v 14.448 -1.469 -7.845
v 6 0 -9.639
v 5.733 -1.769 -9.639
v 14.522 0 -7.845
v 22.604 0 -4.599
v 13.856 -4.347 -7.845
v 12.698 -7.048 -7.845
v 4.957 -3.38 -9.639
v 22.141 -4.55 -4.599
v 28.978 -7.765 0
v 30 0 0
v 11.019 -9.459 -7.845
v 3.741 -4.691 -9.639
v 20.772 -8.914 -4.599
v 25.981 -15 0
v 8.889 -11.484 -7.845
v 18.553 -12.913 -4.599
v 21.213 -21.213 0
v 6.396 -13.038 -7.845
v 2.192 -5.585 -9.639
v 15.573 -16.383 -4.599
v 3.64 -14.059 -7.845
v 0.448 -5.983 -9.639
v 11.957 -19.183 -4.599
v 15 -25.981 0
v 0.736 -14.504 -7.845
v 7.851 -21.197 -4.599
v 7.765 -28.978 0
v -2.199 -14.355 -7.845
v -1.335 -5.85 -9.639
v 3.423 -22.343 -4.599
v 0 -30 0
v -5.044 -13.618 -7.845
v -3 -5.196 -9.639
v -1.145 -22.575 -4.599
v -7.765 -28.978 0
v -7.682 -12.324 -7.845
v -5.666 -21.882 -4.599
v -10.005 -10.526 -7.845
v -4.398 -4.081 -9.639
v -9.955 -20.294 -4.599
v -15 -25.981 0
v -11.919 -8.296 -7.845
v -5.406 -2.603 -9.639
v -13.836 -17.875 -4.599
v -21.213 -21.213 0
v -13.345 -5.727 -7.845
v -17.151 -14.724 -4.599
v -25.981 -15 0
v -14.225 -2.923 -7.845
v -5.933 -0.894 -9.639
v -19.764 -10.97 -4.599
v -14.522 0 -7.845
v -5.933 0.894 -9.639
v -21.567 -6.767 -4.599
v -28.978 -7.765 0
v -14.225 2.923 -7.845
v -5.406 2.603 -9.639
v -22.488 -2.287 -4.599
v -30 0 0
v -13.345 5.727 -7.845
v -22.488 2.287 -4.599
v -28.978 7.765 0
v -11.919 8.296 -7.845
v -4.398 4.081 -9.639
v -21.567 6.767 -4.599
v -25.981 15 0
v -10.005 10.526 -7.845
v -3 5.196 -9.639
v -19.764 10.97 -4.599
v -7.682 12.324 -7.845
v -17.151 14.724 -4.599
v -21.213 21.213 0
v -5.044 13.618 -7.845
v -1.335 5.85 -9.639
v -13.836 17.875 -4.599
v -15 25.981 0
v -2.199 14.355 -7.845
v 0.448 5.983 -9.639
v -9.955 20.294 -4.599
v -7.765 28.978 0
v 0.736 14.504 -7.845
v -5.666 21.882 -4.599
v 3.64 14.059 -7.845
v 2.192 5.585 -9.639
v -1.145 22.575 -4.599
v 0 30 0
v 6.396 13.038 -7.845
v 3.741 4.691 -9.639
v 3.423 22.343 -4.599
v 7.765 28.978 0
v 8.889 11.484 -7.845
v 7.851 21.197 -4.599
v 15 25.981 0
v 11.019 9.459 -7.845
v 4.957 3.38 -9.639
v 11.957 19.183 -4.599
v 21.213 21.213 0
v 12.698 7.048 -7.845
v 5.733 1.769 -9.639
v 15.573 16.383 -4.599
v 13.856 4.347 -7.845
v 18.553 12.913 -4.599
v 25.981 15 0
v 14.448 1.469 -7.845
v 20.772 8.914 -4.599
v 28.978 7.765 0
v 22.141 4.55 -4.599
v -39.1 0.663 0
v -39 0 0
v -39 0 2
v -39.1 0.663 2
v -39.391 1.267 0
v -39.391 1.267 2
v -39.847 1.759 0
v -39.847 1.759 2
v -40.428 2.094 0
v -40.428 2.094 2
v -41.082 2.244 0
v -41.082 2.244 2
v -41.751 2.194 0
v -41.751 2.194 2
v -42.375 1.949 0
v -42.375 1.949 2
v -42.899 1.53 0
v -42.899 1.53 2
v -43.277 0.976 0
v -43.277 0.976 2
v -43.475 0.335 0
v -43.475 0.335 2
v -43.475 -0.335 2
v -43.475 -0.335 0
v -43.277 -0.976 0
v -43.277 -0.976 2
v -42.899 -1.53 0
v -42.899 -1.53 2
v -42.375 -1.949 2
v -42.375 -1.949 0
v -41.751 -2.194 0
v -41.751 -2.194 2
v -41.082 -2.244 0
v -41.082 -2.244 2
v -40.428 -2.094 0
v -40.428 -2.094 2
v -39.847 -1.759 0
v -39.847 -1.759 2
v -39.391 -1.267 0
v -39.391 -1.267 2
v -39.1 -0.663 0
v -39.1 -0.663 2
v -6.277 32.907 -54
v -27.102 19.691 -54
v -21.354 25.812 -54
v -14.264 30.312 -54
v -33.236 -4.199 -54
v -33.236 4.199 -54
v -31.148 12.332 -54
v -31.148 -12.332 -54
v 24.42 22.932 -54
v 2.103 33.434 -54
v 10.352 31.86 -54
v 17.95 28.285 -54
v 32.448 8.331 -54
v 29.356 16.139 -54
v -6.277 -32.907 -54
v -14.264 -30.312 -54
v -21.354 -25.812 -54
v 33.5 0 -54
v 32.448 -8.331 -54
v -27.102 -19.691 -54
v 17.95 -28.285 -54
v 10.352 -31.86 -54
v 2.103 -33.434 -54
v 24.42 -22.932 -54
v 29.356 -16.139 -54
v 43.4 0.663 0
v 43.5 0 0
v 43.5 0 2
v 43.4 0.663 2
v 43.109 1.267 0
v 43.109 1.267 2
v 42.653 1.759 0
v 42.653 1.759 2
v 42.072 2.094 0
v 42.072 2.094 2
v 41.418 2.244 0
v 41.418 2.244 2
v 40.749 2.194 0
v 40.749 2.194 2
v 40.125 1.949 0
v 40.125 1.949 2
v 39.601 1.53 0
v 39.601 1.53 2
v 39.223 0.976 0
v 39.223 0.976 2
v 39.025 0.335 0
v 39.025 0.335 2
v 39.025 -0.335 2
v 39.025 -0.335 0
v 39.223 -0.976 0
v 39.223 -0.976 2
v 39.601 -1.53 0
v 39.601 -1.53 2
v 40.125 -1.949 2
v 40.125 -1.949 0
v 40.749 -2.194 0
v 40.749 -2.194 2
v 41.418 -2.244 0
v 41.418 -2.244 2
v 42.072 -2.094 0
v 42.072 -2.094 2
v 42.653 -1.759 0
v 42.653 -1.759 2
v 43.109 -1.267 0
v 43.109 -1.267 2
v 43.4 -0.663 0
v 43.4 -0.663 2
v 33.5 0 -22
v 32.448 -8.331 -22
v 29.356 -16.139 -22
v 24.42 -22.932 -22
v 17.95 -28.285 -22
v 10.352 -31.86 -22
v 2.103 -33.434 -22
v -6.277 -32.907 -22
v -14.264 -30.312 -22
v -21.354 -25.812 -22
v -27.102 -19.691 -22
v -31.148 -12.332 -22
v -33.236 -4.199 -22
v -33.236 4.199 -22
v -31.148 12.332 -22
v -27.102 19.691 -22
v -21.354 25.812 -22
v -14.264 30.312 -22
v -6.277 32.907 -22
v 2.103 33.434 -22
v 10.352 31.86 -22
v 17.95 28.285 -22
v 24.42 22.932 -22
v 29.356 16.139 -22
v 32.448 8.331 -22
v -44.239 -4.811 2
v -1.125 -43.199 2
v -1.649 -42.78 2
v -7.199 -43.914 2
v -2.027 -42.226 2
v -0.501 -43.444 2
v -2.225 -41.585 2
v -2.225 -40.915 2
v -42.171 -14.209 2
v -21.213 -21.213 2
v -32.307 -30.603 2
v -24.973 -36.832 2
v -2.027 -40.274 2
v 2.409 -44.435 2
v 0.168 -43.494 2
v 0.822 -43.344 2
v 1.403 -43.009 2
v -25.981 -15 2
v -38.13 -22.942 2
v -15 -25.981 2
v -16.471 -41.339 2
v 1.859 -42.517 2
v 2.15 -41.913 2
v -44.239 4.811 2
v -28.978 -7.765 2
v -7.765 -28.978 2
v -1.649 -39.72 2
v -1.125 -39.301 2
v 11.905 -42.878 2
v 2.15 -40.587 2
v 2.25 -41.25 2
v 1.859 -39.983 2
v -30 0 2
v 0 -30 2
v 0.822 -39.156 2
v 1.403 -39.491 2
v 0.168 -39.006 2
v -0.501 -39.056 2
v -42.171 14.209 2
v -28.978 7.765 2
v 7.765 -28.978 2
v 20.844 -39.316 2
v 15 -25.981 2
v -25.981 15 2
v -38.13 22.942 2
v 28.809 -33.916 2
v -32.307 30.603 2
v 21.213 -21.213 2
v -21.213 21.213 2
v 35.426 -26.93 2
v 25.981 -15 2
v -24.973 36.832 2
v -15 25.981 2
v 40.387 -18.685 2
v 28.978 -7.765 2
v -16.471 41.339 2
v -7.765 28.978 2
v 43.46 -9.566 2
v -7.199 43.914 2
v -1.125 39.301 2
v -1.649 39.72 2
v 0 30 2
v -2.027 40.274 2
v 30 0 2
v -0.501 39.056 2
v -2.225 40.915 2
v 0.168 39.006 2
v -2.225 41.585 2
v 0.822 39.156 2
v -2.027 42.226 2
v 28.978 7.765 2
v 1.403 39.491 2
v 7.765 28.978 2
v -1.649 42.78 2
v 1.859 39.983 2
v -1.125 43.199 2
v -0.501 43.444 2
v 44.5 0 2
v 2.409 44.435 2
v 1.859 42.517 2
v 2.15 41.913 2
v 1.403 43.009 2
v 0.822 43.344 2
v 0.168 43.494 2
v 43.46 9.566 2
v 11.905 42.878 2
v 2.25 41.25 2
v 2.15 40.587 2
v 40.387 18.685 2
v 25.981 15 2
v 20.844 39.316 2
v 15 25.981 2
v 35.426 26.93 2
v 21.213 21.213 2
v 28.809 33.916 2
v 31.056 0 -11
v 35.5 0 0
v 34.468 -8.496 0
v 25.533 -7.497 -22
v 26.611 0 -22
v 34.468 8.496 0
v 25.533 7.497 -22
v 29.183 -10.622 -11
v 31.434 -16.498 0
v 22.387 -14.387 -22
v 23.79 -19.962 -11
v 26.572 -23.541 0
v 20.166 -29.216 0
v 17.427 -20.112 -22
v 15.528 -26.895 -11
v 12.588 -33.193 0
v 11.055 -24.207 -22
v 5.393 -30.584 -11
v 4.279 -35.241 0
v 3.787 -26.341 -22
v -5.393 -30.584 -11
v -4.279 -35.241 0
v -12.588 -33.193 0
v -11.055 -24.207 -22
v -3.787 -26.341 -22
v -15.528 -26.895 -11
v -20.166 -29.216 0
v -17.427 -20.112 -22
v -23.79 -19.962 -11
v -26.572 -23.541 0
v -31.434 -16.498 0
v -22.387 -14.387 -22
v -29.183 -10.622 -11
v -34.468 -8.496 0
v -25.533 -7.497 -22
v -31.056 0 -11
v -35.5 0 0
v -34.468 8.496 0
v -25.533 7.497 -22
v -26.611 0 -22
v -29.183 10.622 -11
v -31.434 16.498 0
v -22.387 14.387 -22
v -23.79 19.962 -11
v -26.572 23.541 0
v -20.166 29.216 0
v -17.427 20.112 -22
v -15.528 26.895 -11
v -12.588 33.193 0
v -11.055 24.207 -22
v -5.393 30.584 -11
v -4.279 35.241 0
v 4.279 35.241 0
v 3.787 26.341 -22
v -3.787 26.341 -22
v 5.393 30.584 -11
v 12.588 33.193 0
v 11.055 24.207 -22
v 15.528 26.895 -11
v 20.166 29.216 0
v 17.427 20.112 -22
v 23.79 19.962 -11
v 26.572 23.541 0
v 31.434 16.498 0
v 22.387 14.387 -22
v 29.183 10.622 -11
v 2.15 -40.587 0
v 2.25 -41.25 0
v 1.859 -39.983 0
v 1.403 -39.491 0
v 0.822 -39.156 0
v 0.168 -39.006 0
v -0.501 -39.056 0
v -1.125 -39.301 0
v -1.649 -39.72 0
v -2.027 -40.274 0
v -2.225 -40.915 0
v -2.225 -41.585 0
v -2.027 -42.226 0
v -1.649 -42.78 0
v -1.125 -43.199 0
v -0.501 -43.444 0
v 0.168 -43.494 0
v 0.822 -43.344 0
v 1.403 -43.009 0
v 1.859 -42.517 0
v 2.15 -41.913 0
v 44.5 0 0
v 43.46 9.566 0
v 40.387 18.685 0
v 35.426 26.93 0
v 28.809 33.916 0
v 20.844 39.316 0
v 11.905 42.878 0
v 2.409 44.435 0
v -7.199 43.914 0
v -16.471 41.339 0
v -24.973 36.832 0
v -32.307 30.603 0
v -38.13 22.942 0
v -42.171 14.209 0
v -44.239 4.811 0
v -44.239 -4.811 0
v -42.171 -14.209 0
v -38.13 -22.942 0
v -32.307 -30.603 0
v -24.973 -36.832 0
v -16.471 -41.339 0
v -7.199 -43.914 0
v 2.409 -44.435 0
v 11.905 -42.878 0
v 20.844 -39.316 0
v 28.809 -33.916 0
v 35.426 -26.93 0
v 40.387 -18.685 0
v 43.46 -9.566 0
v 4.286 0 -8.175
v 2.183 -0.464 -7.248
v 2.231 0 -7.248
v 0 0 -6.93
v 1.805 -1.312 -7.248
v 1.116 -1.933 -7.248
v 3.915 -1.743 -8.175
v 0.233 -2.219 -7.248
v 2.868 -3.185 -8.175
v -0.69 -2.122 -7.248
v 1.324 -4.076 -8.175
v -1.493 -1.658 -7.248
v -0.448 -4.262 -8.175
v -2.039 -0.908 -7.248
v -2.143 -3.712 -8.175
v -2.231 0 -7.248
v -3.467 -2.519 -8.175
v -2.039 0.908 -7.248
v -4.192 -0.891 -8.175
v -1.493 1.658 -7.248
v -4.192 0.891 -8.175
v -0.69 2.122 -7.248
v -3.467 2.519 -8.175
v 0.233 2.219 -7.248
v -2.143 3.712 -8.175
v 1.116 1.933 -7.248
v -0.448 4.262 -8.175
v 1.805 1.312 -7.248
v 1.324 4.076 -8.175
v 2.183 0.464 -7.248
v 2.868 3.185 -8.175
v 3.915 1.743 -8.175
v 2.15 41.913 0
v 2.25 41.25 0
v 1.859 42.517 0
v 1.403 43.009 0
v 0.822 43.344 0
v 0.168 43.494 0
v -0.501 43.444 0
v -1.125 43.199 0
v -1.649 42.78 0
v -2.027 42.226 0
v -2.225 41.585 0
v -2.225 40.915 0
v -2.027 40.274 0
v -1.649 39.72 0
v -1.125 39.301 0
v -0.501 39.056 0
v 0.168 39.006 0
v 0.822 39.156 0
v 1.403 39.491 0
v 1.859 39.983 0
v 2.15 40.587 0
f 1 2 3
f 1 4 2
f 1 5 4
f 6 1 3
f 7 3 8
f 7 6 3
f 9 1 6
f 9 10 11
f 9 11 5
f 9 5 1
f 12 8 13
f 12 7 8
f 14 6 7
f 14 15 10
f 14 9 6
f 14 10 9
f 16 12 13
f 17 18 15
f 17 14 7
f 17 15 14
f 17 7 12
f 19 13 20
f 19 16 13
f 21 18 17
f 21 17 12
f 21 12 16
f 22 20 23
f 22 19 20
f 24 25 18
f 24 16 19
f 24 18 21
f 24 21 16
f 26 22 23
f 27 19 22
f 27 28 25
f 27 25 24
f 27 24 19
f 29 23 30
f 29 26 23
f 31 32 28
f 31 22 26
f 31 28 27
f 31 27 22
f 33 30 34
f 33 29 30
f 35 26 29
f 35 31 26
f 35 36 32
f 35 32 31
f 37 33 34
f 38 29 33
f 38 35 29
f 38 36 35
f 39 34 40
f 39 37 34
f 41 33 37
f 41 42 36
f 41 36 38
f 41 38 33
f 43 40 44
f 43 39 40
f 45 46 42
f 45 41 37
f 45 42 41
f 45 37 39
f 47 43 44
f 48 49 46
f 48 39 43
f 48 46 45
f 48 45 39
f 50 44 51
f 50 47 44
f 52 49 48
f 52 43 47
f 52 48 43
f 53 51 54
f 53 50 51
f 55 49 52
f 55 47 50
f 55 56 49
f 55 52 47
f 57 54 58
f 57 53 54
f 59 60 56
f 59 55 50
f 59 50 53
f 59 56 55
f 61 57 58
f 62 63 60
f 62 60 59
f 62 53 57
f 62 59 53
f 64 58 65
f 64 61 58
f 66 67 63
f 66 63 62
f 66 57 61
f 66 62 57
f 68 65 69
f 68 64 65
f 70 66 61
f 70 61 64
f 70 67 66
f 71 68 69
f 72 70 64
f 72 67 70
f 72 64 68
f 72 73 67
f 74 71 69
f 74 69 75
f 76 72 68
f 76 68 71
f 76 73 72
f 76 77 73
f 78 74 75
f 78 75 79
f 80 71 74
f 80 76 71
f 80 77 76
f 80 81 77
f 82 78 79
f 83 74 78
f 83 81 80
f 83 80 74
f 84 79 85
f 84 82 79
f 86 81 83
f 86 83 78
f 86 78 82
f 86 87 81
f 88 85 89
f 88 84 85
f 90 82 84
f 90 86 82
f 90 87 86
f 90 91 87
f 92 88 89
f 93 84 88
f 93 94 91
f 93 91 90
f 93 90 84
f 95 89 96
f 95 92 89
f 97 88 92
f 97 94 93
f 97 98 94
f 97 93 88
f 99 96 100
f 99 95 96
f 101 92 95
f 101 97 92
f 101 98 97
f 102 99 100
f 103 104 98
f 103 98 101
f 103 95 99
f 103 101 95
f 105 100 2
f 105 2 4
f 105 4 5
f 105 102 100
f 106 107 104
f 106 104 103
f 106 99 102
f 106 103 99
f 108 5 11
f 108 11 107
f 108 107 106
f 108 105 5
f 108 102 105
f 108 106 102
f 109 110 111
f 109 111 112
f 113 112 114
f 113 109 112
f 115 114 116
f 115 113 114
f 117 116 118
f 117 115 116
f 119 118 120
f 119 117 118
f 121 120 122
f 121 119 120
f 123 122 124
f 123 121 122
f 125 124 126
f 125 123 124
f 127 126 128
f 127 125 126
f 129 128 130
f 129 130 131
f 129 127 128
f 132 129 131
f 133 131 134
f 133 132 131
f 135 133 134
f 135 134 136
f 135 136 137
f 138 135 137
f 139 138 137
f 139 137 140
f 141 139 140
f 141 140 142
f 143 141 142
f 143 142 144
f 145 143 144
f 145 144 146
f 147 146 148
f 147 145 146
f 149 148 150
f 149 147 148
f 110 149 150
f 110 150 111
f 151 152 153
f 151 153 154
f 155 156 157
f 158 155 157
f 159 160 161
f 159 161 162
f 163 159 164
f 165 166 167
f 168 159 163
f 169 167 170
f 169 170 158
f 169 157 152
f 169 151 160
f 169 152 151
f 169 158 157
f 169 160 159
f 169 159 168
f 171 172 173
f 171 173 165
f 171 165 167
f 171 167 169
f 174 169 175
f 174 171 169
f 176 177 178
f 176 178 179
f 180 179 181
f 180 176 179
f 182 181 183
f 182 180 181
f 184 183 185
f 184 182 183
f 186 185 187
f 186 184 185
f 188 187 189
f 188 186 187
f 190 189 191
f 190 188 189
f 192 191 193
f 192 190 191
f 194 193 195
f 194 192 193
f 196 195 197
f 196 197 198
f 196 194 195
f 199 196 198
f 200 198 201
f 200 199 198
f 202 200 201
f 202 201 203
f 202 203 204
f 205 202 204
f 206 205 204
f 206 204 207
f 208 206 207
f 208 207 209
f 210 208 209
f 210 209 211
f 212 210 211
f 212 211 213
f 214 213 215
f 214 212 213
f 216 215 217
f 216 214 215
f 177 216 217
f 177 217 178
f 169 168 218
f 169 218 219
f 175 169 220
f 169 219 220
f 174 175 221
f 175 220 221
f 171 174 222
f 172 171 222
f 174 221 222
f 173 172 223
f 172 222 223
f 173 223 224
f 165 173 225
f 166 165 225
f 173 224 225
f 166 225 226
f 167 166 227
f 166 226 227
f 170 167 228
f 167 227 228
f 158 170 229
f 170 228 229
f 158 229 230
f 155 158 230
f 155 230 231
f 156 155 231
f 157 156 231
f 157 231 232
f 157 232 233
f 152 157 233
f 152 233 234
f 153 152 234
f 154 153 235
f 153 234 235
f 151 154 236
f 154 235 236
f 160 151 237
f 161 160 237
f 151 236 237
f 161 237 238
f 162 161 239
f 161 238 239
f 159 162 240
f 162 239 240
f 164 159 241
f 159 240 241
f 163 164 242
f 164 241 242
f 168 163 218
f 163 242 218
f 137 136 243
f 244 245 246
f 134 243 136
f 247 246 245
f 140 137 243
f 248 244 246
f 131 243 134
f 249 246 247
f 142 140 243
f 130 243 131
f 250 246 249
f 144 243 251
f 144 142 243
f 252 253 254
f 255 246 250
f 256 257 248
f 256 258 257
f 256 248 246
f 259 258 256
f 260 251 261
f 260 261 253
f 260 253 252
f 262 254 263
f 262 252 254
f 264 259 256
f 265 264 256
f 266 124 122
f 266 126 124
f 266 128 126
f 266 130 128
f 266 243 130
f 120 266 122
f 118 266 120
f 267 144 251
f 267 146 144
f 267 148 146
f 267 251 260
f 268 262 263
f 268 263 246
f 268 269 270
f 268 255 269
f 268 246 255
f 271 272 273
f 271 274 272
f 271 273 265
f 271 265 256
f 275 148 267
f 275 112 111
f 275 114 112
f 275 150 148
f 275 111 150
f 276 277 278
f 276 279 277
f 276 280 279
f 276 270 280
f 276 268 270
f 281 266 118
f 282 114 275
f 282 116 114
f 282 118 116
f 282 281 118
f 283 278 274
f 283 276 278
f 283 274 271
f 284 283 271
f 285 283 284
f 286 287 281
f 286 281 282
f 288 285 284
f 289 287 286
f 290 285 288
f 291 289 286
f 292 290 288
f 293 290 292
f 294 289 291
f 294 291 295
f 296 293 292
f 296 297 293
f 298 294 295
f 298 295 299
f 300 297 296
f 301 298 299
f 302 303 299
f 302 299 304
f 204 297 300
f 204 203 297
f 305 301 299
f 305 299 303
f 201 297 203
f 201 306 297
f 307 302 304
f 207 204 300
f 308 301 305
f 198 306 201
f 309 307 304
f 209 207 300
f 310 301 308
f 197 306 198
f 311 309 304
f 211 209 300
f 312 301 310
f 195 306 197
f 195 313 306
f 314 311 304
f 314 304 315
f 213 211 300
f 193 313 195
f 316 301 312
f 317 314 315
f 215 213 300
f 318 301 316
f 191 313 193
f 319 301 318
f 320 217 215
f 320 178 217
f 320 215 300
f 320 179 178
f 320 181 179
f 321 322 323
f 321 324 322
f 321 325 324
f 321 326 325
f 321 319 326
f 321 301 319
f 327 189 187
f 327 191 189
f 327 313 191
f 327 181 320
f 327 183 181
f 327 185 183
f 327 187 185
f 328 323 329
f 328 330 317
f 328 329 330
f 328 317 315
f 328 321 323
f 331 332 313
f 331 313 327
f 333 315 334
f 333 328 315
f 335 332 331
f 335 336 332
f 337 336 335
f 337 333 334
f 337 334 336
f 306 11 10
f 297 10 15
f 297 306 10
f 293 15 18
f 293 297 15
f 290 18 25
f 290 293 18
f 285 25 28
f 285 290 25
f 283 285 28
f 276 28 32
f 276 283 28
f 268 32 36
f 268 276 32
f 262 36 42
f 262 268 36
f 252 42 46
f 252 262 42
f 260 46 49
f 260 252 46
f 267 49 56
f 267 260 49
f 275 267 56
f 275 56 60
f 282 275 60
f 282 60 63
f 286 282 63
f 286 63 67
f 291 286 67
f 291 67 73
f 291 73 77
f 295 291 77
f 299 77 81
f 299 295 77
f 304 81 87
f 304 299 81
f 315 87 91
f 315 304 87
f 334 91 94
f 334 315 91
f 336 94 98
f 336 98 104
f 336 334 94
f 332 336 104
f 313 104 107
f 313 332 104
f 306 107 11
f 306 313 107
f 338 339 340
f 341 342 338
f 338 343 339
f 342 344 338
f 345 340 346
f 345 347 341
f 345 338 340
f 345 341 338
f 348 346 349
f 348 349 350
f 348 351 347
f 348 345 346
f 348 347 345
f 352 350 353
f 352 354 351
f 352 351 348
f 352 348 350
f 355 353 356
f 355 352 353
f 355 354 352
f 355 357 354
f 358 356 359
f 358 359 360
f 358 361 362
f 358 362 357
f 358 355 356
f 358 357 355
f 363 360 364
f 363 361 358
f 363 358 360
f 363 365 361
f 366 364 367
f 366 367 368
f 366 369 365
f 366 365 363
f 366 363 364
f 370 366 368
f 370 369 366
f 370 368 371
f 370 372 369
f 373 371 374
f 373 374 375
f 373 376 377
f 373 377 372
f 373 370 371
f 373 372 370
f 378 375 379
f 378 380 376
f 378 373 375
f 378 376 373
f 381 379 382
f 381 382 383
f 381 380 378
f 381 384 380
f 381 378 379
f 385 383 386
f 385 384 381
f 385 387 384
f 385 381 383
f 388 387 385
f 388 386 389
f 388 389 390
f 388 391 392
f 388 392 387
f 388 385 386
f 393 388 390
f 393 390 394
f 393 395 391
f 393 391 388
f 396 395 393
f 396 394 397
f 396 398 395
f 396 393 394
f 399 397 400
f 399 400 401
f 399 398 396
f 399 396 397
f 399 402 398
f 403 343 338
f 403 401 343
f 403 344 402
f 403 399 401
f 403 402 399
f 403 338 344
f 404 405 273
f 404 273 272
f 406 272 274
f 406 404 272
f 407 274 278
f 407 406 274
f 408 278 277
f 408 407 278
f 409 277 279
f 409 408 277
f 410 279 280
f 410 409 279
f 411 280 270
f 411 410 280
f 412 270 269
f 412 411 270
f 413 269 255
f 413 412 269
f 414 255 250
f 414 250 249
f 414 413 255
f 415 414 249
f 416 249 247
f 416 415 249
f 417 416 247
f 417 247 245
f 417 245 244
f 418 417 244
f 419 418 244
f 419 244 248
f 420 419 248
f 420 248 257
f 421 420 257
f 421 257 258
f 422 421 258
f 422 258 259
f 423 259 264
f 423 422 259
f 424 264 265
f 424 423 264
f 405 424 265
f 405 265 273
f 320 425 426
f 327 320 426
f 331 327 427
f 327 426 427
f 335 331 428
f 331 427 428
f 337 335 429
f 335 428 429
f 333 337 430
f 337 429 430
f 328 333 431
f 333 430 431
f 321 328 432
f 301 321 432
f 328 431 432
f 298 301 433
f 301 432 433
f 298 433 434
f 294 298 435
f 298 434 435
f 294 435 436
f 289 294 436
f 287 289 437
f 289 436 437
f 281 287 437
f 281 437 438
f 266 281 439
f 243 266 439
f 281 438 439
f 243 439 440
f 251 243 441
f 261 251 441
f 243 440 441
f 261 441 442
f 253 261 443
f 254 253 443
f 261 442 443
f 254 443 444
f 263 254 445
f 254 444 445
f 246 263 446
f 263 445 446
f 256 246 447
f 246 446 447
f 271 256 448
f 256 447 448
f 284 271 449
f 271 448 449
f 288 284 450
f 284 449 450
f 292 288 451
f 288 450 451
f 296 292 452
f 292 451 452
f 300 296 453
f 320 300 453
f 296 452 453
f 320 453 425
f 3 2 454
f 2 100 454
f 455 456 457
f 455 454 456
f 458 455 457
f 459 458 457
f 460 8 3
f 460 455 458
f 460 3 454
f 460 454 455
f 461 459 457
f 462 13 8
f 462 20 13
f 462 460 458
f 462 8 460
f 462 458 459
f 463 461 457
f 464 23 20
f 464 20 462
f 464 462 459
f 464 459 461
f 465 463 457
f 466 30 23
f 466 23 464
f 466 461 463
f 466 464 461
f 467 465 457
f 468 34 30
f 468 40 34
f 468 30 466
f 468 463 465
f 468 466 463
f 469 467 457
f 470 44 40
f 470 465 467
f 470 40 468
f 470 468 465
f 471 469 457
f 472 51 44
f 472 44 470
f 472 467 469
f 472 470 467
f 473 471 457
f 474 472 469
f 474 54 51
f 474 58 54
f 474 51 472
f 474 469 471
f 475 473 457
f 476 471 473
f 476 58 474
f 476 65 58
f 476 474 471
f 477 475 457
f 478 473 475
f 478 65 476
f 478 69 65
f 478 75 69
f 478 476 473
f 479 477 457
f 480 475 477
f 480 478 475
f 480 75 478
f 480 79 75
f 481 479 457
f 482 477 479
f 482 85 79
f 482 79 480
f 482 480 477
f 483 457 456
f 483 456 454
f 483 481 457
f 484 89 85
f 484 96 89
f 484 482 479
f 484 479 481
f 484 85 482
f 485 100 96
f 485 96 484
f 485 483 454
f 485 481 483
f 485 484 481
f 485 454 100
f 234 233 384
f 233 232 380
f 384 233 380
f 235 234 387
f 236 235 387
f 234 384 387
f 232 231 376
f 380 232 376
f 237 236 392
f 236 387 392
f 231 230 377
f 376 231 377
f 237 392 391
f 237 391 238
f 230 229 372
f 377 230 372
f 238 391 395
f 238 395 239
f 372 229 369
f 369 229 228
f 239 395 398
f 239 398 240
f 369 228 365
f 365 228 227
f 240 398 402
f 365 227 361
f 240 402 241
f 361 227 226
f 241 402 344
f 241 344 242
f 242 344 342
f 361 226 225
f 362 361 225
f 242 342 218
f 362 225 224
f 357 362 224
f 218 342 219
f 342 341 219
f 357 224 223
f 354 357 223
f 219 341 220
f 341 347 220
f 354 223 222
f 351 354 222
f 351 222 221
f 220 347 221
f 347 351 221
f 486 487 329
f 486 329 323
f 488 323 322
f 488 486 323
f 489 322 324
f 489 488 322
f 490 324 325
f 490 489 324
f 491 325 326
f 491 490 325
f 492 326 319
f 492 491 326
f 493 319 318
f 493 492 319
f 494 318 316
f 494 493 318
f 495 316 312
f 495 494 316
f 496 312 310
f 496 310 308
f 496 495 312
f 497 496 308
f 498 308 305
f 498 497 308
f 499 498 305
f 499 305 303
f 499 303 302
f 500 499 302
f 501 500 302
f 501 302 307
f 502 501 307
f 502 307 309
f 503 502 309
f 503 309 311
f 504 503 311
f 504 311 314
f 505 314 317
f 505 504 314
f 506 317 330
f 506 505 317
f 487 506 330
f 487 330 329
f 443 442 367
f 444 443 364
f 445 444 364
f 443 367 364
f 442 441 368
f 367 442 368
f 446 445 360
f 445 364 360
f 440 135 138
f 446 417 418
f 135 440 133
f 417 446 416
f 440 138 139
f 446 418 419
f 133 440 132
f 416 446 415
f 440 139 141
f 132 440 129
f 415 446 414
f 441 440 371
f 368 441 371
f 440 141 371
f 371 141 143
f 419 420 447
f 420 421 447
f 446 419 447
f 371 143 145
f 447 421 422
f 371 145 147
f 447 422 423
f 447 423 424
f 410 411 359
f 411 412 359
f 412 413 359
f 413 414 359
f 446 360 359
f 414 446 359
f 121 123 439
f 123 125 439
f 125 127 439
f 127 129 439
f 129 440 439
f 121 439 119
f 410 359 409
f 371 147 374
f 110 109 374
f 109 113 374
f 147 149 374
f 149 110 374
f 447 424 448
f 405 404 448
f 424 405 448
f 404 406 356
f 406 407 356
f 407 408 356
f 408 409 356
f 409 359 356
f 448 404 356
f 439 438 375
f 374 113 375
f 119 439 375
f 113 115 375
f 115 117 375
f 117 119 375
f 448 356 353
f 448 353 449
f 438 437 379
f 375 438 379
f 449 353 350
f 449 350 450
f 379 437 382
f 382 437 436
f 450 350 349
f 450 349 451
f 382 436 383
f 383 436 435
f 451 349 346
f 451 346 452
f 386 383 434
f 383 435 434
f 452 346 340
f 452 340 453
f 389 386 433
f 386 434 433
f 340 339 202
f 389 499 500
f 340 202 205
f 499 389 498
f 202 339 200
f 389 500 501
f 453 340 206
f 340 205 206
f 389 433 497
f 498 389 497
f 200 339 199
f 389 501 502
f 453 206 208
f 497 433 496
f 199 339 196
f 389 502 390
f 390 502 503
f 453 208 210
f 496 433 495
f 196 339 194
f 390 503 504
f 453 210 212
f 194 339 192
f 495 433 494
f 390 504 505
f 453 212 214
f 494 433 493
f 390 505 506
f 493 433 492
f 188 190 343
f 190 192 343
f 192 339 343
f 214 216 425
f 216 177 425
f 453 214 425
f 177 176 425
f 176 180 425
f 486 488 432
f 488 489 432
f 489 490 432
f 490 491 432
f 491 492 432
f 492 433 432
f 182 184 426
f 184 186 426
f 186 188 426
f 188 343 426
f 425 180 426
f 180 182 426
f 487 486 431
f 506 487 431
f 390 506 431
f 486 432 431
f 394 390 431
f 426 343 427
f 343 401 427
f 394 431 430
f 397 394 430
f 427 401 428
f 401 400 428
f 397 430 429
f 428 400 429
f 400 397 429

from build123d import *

# Parameters (mm, degrees)
F0_R     = 44.5
F0_R_2   = 2.25
F1_DEPTH = 2
F2_R     = 35.5
F3_DEPTH = 22
F3_TAPER = 22
F4_R     = 33.5
F4_R_2   = 26.6114230316
F5_DEPTH = 32


with BuildPart() as f1:
    # F0 (on Top) → F1 (new body)
    with BuildSketch(Plane.XY):
        Circle(F0_R)
        with Locations((0, -41.25)):
            Circle(F0_R_2, mode=Mode.SUBTRACT)
        with Locations((-41.25, 0)):
            Circle(F0_R_2, mode=Mode.SUBTRACT)
        with Locations((41.25, 0)):
            Circle(F0_R_2, mode=Mode.SUBTRACT)
        with Locations((0, 41.25)):
            Circle(F0_R_2, mode=Mode.SUBTRACT)
    extrude(amount=F1_DEPTH)

    # F2 (on face) → F3 (join)
    with BuildSketch(Plane(origin=(0, 0, 0), x_dir=(1, 0, 0), z_dir=(0, 0, -1))):
        Circle(F2_R)
    extrude(amount=F3_DEPTH, taper=F3_TAPER)

    # F4 (on face) → F5 (join)
    with BuildSketch(Plane(origin=(0, 0, -22), x_dir=(1, 0, 0), z_dir=(0, 0, -1))):
        Circle(F4_R)
        Circle(F4_R_2, mode=Mode.SUBTRACT)
        Circle(F4_R_2)
    extrude(amount=F5_DEPTH)

    # F6 (on Front) → F7 (revolve, cut)
    with BuildSketch(Plane.XZ):
        with BuildLine():
            Line((0, 0), (0, -6.9301972061))
            ThreePointArc((0, -6.9301972061), (3.2915026221, -7.638694584), (6, -9.638694584))
            ThreePointArc((6, -9.638694584), (18.6340040872, -6.3979944791), (30, 0))
            Line((30, 0), (30, 3))
            Line((30, 3), (0, 3))
            Line((0, 3), (0, 0))
        make_face()
    revolve(axis=Axis((0, 0, -5), (0, 0, -1)), mode=Mode.SUBTRACT)


solid = f1.part
